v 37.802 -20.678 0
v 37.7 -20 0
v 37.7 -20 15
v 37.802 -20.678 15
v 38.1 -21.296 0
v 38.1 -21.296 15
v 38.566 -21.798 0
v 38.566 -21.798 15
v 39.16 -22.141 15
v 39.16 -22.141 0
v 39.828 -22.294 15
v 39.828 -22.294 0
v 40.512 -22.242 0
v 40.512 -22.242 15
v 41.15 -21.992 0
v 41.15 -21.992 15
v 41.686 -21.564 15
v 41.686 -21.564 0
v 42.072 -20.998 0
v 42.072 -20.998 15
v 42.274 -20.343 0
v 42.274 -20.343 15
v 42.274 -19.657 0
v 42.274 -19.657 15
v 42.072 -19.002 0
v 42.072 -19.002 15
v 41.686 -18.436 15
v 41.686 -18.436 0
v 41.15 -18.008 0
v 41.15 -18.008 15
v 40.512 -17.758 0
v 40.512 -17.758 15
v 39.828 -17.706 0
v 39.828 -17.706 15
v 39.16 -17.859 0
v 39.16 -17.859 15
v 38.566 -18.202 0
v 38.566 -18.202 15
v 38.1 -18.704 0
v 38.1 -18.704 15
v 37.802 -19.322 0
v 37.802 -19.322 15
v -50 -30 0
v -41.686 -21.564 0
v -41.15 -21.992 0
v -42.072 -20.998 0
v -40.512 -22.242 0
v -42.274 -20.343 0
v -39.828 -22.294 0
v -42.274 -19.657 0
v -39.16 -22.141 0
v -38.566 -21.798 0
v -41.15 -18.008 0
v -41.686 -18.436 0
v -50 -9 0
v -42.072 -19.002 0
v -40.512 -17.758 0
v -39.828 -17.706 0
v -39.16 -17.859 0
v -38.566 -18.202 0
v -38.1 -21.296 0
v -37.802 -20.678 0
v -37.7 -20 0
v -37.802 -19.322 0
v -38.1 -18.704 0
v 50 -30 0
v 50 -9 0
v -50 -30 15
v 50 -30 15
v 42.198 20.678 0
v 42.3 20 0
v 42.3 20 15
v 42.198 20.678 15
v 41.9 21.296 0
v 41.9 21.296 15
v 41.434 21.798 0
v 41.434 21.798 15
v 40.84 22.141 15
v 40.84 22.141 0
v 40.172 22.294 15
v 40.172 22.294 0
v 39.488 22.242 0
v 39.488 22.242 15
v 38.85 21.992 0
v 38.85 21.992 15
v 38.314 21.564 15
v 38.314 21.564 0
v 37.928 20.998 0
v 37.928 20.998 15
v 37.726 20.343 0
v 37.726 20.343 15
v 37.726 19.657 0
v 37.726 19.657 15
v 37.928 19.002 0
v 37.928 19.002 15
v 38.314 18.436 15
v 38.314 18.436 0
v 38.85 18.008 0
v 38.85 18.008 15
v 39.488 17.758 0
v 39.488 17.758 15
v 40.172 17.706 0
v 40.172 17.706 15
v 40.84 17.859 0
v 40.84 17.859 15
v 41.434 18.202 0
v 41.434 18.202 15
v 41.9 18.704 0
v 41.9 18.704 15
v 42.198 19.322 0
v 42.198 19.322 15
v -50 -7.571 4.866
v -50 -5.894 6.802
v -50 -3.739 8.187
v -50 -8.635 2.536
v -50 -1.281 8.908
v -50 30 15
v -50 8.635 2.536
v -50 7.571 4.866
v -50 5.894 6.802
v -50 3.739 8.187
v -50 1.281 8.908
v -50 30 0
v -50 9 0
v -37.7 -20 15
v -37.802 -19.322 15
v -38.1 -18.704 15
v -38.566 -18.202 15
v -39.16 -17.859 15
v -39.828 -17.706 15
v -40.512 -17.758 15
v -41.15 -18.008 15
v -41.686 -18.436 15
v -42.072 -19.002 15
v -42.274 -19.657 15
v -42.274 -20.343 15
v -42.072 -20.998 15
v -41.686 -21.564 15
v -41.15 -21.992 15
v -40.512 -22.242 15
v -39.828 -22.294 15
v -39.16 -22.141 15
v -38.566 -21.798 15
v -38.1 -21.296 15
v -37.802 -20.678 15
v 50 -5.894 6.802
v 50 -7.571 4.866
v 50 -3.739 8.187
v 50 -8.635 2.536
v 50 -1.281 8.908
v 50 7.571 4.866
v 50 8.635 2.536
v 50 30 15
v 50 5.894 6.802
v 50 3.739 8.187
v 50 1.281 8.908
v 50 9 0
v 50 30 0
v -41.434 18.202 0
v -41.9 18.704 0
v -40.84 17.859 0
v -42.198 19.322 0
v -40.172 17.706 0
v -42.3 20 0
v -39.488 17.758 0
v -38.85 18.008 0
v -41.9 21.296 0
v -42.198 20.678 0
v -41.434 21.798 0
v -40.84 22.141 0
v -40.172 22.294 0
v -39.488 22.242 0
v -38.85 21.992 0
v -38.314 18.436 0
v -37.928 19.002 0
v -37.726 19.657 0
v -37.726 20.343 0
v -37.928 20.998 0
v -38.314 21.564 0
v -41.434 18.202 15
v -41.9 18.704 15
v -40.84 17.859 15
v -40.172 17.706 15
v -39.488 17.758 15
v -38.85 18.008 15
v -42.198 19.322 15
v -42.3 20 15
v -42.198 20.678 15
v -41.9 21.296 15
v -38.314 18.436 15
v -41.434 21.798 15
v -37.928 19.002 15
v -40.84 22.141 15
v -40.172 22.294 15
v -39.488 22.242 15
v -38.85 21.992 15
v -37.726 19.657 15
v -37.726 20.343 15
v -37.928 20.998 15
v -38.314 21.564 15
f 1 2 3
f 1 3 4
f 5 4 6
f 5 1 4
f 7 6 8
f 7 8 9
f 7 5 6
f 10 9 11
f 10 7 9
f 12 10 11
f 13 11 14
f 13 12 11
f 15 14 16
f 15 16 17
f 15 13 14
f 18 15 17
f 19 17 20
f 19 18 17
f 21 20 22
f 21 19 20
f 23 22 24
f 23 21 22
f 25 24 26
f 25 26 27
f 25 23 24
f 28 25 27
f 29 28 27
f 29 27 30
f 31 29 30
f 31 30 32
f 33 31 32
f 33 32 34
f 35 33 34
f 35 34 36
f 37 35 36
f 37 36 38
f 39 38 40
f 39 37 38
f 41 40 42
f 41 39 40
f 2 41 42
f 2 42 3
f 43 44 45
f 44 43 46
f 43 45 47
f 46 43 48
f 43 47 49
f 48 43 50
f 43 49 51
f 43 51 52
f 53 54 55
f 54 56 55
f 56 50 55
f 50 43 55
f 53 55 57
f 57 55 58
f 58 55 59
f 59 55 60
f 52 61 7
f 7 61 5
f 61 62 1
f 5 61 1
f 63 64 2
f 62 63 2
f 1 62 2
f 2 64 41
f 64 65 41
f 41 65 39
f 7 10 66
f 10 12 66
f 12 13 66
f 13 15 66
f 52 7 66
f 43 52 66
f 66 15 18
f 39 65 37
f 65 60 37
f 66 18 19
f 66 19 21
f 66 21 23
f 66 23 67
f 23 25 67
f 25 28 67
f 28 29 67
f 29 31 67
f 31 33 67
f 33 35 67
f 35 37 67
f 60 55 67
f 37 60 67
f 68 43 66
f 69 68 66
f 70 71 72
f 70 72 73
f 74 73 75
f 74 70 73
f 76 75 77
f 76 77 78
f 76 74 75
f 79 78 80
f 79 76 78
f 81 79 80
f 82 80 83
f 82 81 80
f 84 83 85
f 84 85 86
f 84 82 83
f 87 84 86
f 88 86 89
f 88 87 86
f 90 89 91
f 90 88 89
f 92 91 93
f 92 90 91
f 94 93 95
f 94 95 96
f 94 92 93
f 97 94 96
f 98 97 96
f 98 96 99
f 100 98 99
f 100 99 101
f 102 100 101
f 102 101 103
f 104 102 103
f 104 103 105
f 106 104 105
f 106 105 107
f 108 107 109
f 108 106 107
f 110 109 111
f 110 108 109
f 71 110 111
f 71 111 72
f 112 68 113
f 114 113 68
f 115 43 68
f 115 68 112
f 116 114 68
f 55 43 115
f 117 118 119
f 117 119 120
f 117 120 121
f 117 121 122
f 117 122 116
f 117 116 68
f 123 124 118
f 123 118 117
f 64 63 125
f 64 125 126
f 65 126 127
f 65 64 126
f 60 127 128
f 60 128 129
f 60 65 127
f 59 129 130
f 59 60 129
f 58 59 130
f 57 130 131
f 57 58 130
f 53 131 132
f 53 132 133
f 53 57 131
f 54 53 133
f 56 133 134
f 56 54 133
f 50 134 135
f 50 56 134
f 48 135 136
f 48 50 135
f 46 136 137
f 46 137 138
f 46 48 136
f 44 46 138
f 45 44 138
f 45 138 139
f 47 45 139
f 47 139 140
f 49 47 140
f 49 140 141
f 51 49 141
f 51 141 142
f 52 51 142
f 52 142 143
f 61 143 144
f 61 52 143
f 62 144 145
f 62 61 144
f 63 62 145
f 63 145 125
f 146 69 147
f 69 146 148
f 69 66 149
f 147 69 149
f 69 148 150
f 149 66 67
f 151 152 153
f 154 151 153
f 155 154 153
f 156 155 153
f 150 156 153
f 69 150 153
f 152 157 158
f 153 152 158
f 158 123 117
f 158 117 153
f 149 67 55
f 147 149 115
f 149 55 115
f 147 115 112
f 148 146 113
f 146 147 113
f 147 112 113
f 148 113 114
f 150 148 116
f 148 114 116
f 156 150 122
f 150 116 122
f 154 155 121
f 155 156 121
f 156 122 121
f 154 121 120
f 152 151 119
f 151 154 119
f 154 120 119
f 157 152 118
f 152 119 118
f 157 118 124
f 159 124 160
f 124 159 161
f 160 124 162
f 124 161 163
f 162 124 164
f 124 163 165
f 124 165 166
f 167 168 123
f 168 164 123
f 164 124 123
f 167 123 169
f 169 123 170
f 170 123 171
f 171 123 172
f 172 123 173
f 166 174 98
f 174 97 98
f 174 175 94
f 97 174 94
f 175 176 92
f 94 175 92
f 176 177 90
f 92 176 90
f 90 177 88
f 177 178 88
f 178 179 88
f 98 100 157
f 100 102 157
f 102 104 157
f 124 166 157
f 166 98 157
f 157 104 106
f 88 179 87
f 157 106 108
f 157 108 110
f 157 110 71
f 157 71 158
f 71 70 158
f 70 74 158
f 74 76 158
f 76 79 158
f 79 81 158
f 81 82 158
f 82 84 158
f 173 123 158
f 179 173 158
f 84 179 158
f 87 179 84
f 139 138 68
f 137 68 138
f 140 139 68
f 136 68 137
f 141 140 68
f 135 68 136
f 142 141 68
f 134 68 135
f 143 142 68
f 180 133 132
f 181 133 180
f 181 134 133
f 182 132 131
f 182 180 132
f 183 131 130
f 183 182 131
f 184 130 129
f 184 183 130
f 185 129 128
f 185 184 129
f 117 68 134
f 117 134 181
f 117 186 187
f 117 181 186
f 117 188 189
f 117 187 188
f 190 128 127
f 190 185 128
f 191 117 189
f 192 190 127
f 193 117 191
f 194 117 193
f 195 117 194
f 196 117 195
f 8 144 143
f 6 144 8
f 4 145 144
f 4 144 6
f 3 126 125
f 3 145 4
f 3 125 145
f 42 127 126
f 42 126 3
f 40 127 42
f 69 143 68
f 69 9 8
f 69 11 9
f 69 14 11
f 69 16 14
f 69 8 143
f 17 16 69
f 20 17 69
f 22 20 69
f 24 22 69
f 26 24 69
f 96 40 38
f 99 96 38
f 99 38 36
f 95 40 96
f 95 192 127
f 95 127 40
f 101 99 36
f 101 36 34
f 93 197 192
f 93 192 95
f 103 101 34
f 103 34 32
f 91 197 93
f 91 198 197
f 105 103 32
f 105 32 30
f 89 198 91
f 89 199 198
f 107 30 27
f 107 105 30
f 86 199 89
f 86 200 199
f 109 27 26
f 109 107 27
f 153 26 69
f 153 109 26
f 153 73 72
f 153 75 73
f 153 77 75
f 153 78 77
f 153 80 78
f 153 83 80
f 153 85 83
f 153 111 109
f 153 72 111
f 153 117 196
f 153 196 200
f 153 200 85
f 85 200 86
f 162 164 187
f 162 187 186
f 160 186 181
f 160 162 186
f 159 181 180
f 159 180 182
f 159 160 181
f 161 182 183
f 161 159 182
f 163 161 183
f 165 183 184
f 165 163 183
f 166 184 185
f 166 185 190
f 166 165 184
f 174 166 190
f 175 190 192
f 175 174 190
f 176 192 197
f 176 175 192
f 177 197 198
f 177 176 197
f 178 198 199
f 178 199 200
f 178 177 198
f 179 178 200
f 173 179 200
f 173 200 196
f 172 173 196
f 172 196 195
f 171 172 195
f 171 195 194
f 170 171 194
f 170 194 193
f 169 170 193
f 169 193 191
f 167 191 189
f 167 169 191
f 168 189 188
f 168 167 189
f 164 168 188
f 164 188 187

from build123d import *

# Parameters (mm, degrees)
SKETCH1_W           = 100
SKETCH1_H           = 60
SKETCH1_R           = 2.3
BOSS_EXTRUDE1_DEPTH = 15
SKETCH2_R           = 9
CUT_EXTRUDE1_DEPTH  = 200


with BuildPart() as part:
    # Sketch1 → Boss-Extrude1 (new body)
    with BuildSketch(Plane.XY):
        Rectangle(SKETCH1_W, SKETCH1_H)
        with Locations((-40, -20)):
            Circle(SKETCH1_R, mode=Mode.SUBTRACT)
        with Locations(Location((40, -20, 0), (0, 0, 180))):
            Circle(SKETCH1_R, mode=Mode.SUBTRACT)
        with Locations((40, 20)):
            Circle(SKETCH1_R, mode=Mode.SUBTRACT)
        with Locations(Location((-40, 20, 0), (0, 0, 180))):
            Circle(SKETCH1_R, mode=Mode.SUBTRACT)
    extrude(amount=BOSS_EXTRUDE1_DEPTH)

    # Sketch2 → Cut-Extrude1 (cut, symmetric)
    with BuildSketch(Plane.ZY.offset(50)):
        Circle(SKETCH2_R)
    extrude(amount=CUT_EXTRUDE1_DEPTH, both=True, mode=Mode.SUBTRACT)


solid = part.part
